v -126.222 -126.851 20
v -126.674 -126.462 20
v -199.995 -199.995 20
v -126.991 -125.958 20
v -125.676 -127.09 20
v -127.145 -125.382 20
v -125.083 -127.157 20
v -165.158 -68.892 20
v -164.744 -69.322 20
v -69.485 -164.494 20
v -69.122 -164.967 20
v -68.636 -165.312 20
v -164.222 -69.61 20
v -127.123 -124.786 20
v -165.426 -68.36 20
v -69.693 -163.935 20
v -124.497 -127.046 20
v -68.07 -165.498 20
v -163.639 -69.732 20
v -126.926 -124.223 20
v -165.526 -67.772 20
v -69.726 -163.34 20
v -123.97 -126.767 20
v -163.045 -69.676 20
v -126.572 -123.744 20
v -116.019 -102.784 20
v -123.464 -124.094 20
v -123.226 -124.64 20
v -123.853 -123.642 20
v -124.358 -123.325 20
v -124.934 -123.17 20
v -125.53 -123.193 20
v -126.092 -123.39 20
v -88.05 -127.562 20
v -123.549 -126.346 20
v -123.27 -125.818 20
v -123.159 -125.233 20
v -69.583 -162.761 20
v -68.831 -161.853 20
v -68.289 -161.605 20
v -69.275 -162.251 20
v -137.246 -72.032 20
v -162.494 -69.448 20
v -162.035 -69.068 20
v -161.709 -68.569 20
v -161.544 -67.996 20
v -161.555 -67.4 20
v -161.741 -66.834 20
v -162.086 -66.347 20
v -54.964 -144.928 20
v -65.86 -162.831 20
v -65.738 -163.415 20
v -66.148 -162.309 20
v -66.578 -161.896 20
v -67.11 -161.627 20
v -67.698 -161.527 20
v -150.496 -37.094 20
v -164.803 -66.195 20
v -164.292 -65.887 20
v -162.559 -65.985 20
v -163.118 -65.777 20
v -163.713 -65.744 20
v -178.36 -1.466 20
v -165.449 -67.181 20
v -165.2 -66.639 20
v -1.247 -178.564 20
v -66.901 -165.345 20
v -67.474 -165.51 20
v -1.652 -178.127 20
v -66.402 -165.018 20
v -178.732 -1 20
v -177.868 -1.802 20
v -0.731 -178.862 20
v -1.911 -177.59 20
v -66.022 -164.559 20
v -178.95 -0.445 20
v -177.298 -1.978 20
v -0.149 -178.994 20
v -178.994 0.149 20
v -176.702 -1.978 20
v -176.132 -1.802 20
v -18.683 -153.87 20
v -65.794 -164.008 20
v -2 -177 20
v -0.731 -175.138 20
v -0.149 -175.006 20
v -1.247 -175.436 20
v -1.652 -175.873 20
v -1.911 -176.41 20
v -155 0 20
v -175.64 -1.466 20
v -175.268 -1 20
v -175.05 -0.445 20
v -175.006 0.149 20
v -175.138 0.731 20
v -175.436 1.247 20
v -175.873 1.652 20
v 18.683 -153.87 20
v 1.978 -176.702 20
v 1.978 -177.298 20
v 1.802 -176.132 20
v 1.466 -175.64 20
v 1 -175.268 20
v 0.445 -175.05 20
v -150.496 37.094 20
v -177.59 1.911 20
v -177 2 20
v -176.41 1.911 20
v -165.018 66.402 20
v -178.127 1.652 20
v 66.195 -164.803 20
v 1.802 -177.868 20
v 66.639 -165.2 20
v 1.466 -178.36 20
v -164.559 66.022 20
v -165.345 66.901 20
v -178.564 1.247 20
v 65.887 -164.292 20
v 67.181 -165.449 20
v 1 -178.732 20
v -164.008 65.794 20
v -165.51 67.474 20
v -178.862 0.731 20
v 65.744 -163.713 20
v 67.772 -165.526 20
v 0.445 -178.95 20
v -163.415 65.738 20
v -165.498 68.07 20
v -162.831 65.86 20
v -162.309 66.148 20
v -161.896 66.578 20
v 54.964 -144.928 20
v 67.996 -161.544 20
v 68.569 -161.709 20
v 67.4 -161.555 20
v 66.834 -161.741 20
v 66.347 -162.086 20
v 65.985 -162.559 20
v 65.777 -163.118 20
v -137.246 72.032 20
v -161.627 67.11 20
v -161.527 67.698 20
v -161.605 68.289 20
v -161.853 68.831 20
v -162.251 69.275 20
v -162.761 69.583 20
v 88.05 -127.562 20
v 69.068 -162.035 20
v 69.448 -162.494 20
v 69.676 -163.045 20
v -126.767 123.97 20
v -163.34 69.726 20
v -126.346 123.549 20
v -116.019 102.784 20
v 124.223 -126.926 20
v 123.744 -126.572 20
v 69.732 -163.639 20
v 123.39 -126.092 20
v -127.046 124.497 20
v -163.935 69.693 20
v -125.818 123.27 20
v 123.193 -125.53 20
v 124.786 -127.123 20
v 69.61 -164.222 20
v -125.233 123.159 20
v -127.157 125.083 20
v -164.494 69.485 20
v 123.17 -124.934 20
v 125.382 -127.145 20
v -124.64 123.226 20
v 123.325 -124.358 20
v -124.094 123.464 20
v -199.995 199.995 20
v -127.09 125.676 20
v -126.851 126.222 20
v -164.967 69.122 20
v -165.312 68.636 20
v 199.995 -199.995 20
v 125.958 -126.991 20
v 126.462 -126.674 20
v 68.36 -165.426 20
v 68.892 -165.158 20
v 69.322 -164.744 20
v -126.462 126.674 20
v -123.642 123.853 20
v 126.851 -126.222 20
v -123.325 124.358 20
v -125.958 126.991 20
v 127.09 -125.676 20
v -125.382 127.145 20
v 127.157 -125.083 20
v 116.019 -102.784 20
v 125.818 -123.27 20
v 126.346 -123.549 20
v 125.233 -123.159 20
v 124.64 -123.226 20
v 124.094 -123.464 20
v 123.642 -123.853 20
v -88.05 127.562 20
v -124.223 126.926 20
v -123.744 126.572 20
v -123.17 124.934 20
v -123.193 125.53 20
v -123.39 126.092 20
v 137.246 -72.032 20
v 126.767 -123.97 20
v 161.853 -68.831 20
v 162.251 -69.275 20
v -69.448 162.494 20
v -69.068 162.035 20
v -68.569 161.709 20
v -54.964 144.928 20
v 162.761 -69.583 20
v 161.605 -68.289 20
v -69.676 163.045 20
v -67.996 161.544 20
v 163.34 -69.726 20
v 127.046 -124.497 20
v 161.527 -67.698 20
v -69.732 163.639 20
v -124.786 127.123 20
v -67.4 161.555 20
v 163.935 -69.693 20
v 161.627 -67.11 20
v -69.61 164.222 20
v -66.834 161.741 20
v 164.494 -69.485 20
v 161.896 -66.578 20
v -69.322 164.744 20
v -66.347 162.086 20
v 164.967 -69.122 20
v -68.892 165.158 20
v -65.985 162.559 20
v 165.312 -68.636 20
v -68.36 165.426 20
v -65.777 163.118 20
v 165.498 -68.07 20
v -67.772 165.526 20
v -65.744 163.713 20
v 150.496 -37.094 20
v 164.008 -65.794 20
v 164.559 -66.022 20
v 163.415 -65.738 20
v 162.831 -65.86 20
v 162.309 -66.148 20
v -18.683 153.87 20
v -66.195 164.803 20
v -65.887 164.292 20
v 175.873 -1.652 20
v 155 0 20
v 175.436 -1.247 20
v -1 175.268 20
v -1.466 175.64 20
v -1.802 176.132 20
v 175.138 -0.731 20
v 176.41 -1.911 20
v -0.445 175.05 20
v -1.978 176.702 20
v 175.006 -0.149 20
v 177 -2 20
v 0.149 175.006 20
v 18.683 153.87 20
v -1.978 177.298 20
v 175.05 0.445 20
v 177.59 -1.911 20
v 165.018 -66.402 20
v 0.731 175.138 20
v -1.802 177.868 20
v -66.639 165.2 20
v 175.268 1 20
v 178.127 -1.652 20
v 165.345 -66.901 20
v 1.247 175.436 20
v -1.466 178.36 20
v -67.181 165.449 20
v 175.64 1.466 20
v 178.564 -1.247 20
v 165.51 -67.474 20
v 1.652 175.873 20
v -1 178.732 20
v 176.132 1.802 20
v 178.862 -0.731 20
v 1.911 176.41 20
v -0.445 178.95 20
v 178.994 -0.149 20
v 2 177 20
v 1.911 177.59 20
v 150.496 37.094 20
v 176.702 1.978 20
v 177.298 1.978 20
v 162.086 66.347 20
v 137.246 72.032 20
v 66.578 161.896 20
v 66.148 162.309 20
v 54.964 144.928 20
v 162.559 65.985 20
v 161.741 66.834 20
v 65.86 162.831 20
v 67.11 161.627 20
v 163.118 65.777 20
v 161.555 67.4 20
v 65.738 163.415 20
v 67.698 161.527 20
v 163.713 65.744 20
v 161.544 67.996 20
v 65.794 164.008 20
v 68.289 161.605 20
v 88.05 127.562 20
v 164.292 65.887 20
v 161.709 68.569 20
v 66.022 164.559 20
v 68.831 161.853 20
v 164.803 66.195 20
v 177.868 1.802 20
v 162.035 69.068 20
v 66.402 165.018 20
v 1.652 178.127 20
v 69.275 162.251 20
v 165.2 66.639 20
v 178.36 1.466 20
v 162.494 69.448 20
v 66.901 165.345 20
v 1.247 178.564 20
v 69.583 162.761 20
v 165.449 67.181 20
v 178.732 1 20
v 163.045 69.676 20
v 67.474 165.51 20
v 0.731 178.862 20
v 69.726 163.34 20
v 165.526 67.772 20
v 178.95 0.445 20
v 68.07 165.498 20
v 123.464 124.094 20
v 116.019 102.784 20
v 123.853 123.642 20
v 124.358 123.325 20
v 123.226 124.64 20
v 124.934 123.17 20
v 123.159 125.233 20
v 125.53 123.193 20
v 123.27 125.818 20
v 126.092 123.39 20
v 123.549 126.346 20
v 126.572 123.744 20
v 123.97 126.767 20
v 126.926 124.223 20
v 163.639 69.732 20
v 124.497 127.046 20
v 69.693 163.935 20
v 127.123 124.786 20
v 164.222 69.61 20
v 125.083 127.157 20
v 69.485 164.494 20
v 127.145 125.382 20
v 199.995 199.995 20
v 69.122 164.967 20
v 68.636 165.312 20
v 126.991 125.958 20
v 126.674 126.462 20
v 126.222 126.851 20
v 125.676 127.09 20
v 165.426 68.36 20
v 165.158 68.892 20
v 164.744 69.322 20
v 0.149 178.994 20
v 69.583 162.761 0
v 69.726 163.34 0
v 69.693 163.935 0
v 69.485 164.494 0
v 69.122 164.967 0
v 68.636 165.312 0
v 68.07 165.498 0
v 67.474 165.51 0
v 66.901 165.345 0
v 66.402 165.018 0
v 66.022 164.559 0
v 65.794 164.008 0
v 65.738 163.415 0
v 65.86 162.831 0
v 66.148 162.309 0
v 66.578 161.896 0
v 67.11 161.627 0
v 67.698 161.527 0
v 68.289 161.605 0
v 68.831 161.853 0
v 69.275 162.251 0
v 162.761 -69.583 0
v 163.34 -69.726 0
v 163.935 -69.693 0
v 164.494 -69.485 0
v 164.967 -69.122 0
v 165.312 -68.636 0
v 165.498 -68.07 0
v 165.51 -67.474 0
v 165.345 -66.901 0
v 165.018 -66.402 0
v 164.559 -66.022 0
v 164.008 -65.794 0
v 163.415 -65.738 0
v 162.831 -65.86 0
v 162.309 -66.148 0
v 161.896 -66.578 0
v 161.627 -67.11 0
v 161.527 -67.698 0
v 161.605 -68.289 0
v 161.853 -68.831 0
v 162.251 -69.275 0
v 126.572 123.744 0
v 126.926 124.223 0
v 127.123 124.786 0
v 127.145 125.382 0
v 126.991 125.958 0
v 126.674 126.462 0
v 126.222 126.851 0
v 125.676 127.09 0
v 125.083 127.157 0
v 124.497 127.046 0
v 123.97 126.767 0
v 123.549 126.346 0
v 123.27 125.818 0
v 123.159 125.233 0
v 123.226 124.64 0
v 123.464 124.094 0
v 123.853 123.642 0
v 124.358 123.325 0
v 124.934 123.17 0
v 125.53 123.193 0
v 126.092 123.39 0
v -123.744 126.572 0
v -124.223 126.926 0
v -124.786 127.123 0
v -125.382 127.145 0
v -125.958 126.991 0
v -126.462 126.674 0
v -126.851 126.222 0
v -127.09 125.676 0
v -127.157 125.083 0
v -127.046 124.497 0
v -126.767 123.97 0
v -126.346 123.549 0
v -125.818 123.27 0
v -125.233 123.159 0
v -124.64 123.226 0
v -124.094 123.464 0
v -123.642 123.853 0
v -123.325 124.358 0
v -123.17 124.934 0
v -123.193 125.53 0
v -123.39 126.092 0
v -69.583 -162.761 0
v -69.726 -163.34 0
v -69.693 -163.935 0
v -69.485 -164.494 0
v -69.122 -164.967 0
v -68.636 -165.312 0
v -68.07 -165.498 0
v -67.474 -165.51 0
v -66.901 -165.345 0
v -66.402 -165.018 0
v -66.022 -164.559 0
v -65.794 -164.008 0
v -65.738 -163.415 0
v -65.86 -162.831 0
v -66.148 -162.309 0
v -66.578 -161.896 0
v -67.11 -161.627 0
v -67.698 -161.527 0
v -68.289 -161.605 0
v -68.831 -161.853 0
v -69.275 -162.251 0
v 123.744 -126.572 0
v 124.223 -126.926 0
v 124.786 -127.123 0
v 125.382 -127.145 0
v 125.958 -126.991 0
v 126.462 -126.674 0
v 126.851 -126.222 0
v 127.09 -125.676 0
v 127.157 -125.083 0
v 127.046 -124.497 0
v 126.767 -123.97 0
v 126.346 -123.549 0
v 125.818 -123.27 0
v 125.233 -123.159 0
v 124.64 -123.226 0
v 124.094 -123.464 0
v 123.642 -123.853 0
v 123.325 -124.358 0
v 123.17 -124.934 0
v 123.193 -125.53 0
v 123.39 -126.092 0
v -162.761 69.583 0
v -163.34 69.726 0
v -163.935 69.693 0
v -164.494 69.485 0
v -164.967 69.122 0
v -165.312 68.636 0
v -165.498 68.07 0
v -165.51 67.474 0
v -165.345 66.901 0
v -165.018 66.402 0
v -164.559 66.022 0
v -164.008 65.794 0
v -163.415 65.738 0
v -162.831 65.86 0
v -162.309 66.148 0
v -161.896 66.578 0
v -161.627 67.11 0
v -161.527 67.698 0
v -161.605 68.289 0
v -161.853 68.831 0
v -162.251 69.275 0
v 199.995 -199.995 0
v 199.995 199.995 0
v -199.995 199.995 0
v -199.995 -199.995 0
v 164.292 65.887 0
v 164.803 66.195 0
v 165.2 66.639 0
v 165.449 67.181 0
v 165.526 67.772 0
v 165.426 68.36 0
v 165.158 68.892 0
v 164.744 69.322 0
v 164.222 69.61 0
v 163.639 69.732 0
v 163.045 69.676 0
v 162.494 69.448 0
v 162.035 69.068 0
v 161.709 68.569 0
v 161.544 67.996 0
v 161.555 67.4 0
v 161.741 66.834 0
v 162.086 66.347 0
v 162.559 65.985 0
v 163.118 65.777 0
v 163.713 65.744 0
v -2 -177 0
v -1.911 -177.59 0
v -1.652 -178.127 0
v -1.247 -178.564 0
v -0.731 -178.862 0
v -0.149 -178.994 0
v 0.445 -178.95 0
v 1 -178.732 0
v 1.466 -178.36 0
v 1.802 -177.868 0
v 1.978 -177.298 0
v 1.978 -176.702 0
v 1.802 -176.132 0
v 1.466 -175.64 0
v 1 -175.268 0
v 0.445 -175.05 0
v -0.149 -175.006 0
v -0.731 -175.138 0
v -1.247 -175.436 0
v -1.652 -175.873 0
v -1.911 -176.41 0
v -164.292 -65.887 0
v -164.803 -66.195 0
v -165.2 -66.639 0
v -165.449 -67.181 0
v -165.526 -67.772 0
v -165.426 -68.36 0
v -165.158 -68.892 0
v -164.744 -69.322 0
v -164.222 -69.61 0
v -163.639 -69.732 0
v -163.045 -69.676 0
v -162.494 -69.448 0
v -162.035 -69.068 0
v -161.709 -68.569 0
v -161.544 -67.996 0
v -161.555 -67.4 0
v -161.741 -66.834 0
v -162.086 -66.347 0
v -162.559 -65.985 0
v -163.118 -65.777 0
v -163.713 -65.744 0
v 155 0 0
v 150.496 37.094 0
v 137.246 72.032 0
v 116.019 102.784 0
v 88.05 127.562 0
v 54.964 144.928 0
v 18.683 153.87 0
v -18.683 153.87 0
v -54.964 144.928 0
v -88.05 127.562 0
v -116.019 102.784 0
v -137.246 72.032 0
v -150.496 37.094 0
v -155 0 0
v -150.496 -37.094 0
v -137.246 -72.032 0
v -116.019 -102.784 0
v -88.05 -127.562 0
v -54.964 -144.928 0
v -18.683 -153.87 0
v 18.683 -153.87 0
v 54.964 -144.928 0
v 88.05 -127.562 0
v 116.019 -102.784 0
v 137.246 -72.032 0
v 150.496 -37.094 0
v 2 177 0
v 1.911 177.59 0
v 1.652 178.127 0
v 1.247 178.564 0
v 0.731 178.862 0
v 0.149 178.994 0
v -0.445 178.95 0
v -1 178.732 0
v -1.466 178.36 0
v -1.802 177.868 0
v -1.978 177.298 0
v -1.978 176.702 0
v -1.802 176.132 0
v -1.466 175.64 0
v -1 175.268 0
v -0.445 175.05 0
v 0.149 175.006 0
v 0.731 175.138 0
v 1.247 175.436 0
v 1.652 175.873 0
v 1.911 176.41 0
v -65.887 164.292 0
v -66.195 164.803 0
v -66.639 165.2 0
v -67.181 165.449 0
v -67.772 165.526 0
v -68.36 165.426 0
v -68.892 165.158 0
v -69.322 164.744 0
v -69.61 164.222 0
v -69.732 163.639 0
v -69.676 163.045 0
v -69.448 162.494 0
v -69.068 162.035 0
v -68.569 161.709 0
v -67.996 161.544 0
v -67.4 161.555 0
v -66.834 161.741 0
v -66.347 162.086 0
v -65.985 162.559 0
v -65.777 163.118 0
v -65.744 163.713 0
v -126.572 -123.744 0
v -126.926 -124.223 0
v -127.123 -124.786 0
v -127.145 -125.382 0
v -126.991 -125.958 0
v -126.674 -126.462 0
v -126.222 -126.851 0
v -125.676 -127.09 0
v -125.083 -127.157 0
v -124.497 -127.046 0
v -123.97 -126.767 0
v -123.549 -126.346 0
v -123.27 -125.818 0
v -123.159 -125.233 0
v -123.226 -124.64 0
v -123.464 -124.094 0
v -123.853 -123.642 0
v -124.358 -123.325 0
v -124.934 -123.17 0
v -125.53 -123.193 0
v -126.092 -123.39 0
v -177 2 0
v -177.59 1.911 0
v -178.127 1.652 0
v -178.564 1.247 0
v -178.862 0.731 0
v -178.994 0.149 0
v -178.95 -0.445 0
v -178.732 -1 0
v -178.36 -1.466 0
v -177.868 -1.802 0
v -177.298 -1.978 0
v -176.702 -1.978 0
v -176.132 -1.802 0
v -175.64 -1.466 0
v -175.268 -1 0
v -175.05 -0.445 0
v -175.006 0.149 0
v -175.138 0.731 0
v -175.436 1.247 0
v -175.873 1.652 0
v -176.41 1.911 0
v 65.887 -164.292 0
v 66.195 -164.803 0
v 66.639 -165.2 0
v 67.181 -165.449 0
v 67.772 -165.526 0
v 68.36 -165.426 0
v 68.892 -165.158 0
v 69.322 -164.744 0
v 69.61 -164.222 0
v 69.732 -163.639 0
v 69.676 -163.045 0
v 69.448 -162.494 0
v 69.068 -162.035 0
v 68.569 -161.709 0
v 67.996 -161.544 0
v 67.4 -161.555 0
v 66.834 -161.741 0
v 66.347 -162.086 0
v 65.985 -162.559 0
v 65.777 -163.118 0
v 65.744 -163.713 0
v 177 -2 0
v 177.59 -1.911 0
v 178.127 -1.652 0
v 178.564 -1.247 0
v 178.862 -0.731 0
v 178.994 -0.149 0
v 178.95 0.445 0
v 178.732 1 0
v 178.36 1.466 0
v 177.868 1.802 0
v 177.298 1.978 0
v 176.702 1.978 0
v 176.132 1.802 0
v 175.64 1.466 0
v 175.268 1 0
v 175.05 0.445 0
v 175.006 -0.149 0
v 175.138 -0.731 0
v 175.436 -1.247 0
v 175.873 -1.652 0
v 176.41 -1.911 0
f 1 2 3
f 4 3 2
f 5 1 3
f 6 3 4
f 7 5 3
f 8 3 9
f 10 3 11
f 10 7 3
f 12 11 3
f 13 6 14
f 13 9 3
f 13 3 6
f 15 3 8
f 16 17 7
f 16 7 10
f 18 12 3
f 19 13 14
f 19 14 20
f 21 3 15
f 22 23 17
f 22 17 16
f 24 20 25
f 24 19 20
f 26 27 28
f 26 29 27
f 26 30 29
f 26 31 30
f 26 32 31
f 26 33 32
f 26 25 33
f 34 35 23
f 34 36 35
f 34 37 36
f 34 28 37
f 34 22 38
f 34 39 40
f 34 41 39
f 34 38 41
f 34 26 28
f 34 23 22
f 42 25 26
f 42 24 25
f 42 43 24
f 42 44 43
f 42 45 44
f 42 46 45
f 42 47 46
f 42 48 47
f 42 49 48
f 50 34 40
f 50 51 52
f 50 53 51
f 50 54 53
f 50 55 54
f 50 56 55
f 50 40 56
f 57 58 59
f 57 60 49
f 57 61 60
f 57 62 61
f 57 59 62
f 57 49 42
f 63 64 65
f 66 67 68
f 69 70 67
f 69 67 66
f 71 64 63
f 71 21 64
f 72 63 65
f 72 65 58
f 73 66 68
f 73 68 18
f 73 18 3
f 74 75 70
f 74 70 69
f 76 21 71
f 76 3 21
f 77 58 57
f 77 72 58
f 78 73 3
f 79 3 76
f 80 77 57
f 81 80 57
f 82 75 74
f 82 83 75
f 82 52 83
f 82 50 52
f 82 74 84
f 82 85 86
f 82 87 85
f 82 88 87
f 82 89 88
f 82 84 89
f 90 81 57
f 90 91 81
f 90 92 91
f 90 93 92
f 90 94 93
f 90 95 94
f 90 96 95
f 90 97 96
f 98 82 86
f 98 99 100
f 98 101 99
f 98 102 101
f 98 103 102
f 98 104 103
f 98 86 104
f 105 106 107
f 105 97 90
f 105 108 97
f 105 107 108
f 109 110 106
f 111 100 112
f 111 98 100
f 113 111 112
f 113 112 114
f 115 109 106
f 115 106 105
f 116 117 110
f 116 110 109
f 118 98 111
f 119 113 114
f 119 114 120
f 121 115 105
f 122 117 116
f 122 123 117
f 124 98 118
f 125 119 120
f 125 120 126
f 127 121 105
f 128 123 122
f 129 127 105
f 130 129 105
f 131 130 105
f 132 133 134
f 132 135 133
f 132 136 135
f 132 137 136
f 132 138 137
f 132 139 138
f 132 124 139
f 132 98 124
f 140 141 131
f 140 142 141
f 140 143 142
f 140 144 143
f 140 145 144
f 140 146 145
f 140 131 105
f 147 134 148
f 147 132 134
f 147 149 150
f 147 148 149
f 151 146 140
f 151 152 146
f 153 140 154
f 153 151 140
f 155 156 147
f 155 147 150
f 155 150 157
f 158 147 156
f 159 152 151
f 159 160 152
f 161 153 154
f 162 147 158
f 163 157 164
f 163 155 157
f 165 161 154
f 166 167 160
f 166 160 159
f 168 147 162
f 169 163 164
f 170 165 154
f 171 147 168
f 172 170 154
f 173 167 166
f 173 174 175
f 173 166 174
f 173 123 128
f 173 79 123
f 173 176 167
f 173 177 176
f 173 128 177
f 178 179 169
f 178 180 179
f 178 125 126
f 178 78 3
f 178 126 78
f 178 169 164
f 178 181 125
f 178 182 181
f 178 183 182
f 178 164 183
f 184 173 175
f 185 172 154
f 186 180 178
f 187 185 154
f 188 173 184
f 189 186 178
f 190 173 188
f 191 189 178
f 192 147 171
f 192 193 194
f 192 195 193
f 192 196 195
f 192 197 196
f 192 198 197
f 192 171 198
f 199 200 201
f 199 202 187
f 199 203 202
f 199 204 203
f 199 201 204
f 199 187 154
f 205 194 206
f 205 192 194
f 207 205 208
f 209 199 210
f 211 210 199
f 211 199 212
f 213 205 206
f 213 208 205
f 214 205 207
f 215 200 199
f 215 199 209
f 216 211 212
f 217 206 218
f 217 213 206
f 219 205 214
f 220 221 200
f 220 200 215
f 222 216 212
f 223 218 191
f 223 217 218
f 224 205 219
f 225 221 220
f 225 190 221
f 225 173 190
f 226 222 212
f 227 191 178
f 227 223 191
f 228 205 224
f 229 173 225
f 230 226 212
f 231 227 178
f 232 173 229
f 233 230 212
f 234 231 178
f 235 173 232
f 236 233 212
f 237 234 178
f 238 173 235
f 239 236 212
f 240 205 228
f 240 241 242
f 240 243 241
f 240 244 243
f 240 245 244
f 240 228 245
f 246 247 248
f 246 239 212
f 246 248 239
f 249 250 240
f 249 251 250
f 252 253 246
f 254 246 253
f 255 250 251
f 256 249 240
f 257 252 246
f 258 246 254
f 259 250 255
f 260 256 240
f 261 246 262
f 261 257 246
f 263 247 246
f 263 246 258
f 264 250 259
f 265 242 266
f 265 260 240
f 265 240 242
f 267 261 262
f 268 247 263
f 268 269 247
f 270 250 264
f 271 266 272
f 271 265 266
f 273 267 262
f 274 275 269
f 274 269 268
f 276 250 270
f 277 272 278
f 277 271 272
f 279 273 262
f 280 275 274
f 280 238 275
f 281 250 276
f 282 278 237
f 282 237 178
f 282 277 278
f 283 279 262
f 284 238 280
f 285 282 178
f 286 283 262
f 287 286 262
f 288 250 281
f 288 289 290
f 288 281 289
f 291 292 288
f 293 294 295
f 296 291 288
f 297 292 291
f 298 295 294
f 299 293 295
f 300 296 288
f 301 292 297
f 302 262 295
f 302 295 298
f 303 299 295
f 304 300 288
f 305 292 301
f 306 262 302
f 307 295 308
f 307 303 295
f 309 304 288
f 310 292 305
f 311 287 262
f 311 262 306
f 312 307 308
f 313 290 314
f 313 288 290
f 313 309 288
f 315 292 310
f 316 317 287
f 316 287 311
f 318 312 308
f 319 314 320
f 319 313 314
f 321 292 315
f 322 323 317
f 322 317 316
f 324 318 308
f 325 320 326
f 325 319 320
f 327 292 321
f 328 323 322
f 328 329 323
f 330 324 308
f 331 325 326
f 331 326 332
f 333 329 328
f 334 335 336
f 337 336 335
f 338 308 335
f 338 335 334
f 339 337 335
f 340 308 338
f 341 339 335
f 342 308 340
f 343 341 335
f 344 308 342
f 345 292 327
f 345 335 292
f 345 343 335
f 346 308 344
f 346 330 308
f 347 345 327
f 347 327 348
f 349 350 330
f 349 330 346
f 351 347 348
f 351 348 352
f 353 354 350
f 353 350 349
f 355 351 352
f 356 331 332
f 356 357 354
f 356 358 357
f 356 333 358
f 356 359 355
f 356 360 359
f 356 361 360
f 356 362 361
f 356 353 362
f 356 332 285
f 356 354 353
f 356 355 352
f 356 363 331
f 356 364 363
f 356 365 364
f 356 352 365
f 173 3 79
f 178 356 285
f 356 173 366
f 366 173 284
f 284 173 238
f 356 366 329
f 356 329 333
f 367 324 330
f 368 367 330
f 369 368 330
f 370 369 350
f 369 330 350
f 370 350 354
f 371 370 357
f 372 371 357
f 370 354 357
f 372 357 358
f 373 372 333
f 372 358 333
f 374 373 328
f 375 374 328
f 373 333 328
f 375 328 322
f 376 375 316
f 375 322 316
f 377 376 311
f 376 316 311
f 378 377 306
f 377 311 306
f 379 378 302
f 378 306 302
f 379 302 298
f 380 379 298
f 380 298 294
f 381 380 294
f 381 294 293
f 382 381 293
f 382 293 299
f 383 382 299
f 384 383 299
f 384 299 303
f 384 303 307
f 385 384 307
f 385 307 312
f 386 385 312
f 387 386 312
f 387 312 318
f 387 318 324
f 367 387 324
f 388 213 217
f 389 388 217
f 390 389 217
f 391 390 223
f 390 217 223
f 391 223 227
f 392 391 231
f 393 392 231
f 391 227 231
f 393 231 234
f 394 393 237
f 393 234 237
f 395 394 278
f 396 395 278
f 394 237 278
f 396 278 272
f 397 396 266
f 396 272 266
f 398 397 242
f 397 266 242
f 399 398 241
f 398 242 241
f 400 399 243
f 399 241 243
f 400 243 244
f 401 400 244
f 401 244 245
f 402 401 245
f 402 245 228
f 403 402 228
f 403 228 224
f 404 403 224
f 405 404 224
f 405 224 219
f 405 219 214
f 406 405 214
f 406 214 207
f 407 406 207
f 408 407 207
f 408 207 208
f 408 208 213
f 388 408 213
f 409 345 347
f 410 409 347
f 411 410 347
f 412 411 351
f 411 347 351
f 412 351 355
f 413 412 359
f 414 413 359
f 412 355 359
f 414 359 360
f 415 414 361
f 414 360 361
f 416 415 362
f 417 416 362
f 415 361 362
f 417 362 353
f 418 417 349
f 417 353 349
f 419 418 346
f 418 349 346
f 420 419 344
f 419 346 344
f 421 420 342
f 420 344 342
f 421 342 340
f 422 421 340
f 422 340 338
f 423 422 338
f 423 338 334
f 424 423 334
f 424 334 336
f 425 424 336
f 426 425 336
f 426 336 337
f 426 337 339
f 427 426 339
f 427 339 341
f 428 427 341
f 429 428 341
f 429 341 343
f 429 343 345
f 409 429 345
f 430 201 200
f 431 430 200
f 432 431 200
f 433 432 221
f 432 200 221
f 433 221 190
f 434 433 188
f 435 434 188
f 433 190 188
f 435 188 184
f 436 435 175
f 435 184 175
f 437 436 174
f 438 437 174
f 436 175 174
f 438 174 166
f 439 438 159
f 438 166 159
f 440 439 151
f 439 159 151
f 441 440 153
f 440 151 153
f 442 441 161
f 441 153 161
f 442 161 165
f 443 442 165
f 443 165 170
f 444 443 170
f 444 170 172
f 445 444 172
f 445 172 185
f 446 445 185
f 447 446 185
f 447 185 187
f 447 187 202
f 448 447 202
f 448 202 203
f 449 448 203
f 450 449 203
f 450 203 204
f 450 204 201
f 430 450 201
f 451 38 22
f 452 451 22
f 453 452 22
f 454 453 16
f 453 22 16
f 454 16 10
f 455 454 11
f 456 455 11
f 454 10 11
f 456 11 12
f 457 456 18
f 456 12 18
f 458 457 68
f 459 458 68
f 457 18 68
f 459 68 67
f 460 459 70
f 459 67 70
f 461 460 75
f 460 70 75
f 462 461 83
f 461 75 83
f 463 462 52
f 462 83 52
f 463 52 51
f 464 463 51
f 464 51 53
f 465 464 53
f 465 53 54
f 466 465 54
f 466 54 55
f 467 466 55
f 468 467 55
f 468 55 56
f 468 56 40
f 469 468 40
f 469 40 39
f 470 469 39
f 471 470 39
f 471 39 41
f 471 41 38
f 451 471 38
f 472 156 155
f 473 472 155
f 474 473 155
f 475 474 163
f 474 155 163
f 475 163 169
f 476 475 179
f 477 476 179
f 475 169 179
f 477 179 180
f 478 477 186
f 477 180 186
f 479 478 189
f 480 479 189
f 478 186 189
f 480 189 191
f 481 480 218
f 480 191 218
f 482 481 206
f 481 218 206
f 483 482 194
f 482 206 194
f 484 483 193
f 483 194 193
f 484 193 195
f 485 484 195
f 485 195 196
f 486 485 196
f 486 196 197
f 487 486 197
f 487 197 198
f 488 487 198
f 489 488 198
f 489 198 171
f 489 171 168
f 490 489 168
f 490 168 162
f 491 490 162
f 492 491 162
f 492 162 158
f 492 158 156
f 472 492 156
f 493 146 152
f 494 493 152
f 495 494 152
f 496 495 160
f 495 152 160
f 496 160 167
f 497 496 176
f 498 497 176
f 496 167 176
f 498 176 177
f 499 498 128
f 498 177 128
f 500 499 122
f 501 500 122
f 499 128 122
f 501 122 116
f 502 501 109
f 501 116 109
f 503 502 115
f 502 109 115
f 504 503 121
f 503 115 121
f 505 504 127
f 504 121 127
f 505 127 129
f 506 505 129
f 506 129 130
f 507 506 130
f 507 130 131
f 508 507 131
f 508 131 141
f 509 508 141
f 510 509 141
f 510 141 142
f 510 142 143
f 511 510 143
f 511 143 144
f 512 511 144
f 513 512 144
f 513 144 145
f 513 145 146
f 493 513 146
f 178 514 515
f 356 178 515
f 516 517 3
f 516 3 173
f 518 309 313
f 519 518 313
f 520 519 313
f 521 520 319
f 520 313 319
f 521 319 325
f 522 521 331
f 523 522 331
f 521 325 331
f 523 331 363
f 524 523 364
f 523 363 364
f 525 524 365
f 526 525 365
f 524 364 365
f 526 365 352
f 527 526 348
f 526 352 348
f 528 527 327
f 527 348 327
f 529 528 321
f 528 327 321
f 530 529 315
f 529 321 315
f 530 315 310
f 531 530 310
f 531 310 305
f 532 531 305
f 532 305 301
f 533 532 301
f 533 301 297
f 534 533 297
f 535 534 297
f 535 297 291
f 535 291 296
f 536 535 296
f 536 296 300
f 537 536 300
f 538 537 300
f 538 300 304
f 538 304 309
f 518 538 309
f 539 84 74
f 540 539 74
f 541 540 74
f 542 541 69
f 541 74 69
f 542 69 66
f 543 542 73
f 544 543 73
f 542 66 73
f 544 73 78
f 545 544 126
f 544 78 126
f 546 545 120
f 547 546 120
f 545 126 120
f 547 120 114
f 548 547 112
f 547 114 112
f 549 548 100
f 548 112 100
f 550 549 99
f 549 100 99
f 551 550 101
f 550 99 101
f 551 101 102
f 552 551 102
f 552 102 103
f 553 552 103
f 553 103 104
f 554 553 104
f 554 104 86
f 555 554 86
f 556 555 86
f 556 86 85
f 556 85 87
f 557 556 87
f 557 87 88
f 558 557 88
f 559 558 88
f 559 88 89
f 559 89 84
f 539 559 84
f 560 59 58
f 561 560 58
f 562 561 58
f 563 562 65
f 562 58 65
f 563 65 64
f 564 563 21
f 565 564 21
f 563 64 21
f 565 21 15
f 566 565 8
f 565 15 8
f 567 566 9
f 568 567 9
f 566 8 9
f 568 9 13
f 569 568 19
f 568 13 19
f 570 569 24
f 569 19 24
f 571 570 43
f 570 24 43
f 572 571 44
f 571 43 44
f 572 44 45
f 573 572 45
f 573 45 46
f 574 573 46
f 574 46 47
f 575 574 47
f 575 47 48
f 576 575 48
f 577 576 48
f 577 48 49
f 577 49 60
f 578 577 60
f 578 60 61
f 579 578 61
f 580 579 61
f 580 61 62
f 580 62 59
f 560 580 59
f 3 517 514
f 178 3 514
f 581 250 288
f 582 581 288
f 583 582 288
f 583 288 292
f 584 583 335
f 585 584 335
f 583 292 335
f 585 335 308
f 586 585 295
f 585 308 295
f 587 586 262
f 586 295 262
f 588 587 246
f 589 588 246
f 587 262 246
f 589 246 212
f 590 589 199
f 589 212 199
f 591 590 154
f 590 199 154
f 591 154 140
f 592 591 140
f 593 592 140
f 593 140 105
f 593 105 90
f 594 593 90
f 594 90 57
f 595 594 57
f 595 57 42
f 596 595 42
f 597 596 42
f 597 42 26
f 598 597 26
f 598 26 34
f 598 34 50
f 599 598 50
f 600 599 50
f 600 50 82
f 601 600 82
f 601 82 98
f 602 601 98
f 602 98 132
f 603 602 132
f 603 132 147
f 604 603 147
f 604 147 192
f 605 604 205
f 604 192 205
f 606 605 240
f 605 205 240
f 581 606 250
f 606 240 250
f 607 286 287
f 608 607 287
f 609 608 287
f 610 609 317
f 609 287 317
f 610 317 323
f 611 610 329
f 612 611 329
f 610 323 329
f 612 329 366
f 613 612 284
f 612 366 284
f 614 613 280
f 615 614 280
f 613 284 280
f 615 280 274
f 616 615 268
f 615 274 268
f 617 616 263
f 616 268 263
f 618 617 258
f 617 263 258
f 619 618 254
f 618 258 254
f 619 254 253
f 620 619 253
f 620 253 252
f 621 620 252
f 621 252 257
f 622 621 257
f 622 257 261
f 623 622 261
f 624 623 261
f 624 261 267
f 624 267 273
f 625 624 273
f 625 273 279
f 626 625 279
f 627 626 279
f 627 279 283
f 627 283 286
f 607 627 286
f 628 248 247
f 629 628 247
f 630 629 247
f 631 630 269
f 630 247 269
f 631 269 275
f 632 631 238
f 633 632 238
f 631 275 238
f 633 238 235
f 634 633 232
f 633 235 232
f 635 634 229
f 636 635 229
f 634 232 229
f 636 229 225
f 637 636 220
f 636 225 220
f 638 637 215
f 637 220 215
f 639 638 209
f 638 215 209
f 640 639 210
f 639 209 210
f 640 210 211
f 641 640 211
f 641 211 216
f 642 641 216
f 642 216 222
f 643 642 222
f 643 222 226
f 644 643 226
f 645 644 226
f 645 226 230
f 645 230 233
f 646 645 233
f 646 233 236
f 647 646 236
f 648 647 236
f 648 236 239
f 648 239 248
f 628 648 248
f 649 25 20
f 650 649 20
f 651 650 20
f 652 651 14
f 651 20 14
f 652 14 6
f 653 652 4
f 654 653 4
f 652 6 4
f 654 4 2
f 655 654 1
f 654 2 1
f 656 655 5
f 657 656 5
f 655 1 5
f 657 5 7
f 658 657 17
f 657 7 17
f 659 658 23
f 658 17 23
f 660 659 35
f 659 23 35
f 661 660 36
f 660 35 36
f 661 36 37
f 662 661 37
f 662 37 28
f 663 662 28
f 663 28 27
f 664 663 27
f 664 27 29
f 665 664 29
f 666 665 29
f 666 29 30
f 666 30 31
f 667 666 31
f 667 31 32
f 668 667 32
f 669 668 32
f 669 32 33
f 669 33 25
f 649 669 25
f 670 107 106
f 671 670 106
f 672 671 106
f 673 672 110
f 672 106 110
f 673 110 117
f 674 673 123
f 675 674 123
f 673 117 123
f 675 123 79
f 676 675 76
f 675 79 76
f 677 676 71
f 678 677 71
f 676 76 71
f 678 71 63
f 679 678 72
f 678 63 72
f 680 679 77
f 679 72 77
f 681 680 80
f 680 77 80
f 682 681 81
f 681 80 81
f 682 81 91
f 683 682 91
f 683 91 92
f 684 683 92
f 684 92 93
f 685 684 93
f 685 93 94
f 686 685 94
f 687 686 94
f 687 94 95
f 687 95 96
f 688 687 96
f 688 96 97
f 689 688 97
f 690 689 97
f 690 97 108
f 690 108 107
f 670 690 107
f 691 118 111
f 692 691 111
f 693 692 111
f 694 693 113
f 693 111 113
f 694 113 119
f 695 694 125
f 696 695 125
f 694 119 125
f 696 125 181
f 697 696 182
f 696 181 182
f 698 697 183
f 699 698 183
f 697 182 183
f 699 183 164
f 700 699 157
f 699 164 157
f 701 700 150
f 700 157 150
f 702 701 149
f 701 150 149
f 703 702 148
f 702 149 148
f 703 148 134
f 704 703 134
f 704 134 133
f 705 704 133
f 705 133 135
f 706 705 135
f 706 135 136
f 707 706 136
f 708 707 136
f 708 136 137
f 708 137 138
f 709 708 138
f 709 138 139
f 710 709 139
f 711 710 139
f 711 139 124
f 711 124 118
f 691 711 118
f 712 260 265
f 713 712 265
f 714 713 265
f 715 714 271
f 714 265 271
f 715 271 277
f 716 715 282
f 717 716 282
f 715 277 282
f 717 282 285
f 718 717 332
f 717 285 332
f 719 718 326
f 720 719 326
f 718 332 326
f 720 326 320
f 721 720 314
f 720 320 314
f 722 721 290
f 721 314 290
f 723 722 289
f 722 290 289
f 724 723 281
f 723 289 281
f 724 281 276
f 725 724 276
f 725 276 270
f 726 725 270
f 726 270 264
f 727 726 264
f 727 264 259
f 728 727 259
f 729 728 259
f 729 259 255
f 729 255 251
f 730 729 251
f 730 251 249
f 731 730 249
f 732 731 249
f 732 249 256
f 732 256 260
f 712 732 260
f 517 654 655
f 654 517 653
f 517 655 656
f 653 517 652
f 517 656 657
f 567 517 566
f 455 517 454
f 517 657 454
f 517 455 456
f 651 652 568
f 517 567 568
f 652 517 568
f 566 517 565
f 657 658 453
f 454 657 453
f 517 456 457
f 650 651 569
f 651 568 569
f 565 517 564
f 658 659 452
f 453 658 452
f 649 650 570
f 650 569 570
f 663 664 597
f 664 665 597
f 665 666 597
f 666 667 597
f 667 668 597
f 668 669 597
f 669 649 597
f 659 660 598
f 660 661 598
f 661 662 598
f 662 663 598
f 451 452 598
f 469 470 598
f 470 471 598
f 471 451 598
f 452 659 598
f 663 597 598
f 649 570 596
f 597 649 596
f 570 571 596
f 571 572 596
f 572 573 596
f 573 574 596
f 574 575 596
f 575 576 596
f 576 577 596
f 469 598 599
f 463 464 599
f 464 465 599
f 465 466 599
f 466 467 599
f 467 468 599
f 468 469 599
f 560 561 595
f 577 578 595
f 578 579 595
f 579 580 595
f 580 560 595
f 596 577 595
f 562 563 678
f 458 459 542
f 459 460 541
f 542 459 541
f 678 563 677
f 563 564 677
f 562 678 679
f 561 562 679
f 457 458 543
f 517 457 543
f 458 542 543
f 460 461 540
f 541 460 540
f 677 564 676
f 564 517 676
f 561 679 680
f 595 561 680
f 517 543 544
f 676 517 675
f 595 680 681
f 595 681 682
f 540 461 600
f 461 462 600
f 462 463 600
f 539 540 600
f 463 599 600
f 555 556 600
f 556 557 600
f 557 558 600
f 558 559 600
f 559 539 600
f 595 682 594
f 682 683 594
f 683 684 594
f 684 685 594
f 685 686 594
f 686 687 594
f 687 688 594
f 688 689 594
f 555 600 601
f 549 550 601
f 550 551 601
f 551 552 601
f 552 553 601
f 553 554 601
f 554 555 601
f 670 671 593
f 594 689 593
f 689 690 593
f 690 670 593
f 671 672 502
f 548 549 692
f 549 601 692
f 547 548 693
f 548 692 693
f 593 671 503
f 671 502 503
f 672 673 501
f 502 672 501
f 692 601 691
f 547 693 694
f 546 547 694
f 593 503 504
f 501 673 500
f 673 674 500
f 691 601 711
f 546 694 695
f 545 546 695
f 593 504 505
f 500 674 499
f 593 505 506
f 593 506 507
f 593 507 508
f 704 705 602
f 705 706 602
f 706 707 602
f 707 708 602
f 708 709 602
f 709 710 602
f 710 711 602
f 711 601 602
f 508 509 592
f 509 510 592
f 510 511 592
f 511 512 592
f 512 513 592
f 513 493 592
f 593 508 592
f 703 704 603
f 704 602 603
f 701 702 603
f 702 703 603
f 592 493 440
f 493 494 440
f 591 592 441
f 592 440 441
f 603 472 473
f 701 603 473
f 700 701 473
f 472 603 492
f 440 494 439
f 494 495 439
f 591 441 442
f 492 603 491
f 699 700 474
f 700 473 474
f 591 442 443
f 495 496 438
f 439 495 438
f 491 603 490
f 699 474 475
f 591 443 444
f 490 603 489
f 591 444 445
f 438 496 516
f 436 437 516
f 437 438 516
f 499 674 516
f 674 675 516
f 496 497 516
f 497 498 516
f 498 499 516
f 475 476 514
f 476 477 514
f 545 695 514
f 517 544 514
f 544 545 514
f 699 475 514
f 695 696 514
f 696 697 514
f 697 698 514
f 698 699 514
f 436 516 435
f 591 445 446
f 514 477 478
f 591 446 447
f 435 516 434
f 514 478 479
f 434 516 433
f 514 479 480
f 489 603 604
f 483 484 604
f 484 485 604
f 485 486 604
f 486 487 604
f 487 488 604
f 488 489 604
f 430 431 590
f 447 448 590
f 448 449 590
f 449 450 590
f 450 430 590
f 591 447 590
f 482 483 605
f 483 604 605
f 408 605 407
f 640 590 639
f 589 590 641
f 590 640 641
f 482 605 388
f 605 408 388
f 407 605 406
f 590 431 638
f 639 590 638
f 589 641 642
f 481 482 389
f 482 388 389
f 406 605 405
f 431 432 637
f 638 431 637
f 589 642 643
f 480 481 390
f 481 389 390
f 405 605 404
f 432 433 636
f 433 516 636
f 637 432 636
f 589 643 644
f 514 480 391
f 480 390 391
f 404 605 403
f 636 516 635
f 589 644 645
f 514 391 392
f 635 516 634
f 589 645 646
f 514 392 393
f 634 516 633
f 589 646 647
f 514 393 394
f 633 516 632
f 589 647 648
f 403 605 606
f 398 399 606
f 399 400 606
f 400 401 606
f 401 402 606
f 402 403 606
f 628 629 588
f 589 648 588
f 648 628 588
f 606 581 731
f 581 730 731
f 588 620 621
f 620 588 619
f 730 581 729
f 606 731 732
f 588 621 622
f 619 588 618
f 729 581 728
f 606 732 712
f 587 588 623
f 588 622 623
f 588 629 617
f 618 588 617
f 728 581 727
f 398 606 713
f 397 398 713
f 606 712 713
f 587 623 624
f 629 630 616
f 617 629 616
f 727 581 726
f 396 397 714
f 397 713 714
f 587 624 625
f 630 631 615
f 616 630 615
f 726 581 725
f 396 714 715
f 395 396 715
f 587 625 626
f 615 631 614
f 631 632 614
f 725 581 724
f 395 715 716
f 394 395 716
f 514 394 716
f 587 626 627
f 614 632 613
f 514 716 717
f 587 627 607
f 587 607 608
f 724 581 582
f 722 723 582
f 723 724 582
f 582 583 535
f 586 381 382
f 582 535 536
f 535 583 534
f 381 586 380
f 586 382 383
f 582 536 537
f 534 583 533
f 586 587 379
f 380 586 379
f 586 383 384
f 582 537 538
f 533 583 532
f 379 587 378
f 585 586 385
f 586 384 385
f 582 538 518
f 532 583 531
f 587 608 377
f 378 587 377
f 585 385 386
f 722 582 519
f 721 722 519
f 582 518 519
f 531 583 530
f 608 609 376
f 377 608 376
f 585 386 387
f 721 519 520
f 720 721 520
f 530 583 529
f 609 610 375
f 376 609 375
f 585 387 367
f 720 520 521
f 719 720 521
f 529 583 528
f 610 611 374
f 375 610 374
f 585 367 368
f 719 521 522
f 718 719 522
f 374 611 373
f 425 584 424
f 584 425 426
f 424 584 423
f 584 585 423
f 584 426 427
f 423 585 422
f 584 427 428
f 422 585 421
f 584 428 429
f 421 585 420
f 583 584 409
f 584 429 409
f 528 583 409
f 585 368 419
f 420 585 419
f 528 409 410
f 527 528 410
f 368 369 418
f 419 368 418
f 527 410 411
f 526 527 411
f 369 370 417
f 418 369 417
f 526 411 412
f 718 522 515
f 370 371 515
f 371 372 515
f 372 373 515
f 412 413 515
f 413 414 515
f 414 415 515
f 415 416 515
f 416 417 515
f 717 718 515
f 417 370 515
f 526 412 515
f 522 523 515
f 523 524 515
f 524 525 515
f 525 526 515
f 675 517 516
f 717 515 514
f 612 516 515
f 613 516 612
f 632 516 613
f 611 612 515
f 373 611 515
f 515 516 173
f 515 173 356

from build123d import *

# Parameters (mm, degrees)
SKETCH_W           = 399.99
SKETCH_H           = 399.99
PAD_DEPTH          = 20
SKETCH001_R        = 155
POCKET_DEPTH       = 20.001
SKETCH002_R        = 2
POCKET001_DEPTH    = 1152.050469
POLARPATTERN_COUNT = 16


with BuildPart() as part:
    # Sketch → Pad (new body)
    with BuildSketch(Plane.XY):
        Rectangle(SKETCH_W, SKETCH_H)
    extrude(amount=PAD_DEPTH)

    # Sketch001 (on Face6 of Pad) → Pocket (cut, through all)
    with BuildSketch(Plane.XY.offset(20)):
        Circle(SKETCH001_R)
    extrude(amount=-POCKET_DEPTH, mode=Mode.SUBTRACT)

    # Sketch002 (on Face5 of Pocket) → Pocket001 (cut, through all)
    with BuildSketch(Plane.XY.offset(20)):
        with Locations((0, 177)):
            Circle(SKETCH002_R)
    pocket001 = extrude(amount=-POCKET001_DEPTH, mode=Mode.SUBTRACT)

    # PolarPattern: Pocket001 ×16 about axis
    polarpattern_axis = Axis((0, 0, 20), (0, 0, 1))
    for i in range(1, POLARPATTERN_COUNT):
        add(pocket001.rotate(polarpattern_axis, i * 360 / POLARPATTERN_COUNT), mode=Mode.SUBTRACT)


solid = part.part
